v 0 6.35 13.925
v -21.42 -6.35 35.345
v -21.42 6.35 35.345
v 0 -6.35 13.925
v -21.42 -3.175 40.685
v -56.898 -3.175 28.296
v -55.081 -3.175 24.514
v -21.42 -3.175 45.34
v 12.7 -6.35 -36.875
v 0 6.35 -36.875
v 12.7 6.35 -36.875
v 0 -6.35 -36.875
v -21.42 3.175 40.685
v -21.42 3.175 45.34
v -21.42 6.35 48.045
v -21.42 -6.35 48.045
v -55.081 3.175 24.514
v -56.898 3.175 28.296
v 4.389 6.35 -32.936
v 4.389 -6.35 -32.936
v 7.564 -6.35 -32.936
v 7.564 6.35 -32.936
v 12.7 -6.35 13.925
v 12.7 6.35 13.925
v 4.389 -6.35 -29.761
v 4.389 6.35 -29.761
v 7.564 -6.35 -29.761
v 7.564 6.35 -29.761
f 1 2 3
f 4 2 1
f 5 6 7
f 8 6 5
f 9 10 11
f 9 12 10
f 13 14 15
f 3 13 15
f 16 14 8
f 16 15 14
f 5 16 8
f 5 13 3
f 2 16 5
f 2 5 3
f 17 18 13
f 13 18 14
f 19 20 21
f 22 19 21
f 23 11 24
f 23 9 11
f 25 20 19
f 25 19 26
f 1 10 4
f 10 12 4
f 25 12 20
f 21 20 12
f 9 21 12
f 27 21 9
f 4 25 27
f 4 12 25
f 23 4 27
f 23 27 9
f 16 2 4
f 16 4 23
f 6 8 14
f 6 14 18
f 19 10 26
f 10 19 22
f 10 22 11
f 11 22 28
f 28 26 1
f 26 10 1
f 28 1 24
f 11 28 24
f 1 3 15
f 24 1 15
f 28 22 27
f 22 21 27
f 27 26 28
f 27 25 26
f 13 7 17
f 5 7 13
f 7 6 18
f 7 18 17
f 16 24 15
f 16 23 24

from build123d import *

# Parameters (mm, degrees)
F0_W     = 12.7
F0_H     = 50.8
F0_W_2   = 3.175
F0_H_2   = 3.175
F1_DEPTH = 6.35
F2_DEPTH = 3.175


with BuildPart() as f1:
    # F0 (on Front) → F1 (new body, symmetric)
    with BuildSketch(Plane.XZ):
        Polygon((0, 13.925004), (12.7, 13.925004), (-21.420162, 48.045166), (-21.420162, 45.339696), (-21.420162, 40.685079), (-21.420162, 35.345166), align=None)
        with Locations((6.35, -11.474996)):
            Rectangle(F0_W, F0_H)
        with Locations((5.976701, -31.348965)):
            Rectangle(F0_W_2, F0_H_2, mode=Mode.SUBTRACT)
    extrude(amount=F1_DEPTH, both=True)

    # F0 (on Front) → F2 (join, symmetric)
    with BuildSketch(Plane.XZ):
        Polygon((-21.420162, 40.685079), (-21.420162, 45.339696), (-56.897912, 28.29555), (-55.081078, 24.513772), align=None)
    extrude(amount=F2_DEPTH, both=True)


solid = f1.part
